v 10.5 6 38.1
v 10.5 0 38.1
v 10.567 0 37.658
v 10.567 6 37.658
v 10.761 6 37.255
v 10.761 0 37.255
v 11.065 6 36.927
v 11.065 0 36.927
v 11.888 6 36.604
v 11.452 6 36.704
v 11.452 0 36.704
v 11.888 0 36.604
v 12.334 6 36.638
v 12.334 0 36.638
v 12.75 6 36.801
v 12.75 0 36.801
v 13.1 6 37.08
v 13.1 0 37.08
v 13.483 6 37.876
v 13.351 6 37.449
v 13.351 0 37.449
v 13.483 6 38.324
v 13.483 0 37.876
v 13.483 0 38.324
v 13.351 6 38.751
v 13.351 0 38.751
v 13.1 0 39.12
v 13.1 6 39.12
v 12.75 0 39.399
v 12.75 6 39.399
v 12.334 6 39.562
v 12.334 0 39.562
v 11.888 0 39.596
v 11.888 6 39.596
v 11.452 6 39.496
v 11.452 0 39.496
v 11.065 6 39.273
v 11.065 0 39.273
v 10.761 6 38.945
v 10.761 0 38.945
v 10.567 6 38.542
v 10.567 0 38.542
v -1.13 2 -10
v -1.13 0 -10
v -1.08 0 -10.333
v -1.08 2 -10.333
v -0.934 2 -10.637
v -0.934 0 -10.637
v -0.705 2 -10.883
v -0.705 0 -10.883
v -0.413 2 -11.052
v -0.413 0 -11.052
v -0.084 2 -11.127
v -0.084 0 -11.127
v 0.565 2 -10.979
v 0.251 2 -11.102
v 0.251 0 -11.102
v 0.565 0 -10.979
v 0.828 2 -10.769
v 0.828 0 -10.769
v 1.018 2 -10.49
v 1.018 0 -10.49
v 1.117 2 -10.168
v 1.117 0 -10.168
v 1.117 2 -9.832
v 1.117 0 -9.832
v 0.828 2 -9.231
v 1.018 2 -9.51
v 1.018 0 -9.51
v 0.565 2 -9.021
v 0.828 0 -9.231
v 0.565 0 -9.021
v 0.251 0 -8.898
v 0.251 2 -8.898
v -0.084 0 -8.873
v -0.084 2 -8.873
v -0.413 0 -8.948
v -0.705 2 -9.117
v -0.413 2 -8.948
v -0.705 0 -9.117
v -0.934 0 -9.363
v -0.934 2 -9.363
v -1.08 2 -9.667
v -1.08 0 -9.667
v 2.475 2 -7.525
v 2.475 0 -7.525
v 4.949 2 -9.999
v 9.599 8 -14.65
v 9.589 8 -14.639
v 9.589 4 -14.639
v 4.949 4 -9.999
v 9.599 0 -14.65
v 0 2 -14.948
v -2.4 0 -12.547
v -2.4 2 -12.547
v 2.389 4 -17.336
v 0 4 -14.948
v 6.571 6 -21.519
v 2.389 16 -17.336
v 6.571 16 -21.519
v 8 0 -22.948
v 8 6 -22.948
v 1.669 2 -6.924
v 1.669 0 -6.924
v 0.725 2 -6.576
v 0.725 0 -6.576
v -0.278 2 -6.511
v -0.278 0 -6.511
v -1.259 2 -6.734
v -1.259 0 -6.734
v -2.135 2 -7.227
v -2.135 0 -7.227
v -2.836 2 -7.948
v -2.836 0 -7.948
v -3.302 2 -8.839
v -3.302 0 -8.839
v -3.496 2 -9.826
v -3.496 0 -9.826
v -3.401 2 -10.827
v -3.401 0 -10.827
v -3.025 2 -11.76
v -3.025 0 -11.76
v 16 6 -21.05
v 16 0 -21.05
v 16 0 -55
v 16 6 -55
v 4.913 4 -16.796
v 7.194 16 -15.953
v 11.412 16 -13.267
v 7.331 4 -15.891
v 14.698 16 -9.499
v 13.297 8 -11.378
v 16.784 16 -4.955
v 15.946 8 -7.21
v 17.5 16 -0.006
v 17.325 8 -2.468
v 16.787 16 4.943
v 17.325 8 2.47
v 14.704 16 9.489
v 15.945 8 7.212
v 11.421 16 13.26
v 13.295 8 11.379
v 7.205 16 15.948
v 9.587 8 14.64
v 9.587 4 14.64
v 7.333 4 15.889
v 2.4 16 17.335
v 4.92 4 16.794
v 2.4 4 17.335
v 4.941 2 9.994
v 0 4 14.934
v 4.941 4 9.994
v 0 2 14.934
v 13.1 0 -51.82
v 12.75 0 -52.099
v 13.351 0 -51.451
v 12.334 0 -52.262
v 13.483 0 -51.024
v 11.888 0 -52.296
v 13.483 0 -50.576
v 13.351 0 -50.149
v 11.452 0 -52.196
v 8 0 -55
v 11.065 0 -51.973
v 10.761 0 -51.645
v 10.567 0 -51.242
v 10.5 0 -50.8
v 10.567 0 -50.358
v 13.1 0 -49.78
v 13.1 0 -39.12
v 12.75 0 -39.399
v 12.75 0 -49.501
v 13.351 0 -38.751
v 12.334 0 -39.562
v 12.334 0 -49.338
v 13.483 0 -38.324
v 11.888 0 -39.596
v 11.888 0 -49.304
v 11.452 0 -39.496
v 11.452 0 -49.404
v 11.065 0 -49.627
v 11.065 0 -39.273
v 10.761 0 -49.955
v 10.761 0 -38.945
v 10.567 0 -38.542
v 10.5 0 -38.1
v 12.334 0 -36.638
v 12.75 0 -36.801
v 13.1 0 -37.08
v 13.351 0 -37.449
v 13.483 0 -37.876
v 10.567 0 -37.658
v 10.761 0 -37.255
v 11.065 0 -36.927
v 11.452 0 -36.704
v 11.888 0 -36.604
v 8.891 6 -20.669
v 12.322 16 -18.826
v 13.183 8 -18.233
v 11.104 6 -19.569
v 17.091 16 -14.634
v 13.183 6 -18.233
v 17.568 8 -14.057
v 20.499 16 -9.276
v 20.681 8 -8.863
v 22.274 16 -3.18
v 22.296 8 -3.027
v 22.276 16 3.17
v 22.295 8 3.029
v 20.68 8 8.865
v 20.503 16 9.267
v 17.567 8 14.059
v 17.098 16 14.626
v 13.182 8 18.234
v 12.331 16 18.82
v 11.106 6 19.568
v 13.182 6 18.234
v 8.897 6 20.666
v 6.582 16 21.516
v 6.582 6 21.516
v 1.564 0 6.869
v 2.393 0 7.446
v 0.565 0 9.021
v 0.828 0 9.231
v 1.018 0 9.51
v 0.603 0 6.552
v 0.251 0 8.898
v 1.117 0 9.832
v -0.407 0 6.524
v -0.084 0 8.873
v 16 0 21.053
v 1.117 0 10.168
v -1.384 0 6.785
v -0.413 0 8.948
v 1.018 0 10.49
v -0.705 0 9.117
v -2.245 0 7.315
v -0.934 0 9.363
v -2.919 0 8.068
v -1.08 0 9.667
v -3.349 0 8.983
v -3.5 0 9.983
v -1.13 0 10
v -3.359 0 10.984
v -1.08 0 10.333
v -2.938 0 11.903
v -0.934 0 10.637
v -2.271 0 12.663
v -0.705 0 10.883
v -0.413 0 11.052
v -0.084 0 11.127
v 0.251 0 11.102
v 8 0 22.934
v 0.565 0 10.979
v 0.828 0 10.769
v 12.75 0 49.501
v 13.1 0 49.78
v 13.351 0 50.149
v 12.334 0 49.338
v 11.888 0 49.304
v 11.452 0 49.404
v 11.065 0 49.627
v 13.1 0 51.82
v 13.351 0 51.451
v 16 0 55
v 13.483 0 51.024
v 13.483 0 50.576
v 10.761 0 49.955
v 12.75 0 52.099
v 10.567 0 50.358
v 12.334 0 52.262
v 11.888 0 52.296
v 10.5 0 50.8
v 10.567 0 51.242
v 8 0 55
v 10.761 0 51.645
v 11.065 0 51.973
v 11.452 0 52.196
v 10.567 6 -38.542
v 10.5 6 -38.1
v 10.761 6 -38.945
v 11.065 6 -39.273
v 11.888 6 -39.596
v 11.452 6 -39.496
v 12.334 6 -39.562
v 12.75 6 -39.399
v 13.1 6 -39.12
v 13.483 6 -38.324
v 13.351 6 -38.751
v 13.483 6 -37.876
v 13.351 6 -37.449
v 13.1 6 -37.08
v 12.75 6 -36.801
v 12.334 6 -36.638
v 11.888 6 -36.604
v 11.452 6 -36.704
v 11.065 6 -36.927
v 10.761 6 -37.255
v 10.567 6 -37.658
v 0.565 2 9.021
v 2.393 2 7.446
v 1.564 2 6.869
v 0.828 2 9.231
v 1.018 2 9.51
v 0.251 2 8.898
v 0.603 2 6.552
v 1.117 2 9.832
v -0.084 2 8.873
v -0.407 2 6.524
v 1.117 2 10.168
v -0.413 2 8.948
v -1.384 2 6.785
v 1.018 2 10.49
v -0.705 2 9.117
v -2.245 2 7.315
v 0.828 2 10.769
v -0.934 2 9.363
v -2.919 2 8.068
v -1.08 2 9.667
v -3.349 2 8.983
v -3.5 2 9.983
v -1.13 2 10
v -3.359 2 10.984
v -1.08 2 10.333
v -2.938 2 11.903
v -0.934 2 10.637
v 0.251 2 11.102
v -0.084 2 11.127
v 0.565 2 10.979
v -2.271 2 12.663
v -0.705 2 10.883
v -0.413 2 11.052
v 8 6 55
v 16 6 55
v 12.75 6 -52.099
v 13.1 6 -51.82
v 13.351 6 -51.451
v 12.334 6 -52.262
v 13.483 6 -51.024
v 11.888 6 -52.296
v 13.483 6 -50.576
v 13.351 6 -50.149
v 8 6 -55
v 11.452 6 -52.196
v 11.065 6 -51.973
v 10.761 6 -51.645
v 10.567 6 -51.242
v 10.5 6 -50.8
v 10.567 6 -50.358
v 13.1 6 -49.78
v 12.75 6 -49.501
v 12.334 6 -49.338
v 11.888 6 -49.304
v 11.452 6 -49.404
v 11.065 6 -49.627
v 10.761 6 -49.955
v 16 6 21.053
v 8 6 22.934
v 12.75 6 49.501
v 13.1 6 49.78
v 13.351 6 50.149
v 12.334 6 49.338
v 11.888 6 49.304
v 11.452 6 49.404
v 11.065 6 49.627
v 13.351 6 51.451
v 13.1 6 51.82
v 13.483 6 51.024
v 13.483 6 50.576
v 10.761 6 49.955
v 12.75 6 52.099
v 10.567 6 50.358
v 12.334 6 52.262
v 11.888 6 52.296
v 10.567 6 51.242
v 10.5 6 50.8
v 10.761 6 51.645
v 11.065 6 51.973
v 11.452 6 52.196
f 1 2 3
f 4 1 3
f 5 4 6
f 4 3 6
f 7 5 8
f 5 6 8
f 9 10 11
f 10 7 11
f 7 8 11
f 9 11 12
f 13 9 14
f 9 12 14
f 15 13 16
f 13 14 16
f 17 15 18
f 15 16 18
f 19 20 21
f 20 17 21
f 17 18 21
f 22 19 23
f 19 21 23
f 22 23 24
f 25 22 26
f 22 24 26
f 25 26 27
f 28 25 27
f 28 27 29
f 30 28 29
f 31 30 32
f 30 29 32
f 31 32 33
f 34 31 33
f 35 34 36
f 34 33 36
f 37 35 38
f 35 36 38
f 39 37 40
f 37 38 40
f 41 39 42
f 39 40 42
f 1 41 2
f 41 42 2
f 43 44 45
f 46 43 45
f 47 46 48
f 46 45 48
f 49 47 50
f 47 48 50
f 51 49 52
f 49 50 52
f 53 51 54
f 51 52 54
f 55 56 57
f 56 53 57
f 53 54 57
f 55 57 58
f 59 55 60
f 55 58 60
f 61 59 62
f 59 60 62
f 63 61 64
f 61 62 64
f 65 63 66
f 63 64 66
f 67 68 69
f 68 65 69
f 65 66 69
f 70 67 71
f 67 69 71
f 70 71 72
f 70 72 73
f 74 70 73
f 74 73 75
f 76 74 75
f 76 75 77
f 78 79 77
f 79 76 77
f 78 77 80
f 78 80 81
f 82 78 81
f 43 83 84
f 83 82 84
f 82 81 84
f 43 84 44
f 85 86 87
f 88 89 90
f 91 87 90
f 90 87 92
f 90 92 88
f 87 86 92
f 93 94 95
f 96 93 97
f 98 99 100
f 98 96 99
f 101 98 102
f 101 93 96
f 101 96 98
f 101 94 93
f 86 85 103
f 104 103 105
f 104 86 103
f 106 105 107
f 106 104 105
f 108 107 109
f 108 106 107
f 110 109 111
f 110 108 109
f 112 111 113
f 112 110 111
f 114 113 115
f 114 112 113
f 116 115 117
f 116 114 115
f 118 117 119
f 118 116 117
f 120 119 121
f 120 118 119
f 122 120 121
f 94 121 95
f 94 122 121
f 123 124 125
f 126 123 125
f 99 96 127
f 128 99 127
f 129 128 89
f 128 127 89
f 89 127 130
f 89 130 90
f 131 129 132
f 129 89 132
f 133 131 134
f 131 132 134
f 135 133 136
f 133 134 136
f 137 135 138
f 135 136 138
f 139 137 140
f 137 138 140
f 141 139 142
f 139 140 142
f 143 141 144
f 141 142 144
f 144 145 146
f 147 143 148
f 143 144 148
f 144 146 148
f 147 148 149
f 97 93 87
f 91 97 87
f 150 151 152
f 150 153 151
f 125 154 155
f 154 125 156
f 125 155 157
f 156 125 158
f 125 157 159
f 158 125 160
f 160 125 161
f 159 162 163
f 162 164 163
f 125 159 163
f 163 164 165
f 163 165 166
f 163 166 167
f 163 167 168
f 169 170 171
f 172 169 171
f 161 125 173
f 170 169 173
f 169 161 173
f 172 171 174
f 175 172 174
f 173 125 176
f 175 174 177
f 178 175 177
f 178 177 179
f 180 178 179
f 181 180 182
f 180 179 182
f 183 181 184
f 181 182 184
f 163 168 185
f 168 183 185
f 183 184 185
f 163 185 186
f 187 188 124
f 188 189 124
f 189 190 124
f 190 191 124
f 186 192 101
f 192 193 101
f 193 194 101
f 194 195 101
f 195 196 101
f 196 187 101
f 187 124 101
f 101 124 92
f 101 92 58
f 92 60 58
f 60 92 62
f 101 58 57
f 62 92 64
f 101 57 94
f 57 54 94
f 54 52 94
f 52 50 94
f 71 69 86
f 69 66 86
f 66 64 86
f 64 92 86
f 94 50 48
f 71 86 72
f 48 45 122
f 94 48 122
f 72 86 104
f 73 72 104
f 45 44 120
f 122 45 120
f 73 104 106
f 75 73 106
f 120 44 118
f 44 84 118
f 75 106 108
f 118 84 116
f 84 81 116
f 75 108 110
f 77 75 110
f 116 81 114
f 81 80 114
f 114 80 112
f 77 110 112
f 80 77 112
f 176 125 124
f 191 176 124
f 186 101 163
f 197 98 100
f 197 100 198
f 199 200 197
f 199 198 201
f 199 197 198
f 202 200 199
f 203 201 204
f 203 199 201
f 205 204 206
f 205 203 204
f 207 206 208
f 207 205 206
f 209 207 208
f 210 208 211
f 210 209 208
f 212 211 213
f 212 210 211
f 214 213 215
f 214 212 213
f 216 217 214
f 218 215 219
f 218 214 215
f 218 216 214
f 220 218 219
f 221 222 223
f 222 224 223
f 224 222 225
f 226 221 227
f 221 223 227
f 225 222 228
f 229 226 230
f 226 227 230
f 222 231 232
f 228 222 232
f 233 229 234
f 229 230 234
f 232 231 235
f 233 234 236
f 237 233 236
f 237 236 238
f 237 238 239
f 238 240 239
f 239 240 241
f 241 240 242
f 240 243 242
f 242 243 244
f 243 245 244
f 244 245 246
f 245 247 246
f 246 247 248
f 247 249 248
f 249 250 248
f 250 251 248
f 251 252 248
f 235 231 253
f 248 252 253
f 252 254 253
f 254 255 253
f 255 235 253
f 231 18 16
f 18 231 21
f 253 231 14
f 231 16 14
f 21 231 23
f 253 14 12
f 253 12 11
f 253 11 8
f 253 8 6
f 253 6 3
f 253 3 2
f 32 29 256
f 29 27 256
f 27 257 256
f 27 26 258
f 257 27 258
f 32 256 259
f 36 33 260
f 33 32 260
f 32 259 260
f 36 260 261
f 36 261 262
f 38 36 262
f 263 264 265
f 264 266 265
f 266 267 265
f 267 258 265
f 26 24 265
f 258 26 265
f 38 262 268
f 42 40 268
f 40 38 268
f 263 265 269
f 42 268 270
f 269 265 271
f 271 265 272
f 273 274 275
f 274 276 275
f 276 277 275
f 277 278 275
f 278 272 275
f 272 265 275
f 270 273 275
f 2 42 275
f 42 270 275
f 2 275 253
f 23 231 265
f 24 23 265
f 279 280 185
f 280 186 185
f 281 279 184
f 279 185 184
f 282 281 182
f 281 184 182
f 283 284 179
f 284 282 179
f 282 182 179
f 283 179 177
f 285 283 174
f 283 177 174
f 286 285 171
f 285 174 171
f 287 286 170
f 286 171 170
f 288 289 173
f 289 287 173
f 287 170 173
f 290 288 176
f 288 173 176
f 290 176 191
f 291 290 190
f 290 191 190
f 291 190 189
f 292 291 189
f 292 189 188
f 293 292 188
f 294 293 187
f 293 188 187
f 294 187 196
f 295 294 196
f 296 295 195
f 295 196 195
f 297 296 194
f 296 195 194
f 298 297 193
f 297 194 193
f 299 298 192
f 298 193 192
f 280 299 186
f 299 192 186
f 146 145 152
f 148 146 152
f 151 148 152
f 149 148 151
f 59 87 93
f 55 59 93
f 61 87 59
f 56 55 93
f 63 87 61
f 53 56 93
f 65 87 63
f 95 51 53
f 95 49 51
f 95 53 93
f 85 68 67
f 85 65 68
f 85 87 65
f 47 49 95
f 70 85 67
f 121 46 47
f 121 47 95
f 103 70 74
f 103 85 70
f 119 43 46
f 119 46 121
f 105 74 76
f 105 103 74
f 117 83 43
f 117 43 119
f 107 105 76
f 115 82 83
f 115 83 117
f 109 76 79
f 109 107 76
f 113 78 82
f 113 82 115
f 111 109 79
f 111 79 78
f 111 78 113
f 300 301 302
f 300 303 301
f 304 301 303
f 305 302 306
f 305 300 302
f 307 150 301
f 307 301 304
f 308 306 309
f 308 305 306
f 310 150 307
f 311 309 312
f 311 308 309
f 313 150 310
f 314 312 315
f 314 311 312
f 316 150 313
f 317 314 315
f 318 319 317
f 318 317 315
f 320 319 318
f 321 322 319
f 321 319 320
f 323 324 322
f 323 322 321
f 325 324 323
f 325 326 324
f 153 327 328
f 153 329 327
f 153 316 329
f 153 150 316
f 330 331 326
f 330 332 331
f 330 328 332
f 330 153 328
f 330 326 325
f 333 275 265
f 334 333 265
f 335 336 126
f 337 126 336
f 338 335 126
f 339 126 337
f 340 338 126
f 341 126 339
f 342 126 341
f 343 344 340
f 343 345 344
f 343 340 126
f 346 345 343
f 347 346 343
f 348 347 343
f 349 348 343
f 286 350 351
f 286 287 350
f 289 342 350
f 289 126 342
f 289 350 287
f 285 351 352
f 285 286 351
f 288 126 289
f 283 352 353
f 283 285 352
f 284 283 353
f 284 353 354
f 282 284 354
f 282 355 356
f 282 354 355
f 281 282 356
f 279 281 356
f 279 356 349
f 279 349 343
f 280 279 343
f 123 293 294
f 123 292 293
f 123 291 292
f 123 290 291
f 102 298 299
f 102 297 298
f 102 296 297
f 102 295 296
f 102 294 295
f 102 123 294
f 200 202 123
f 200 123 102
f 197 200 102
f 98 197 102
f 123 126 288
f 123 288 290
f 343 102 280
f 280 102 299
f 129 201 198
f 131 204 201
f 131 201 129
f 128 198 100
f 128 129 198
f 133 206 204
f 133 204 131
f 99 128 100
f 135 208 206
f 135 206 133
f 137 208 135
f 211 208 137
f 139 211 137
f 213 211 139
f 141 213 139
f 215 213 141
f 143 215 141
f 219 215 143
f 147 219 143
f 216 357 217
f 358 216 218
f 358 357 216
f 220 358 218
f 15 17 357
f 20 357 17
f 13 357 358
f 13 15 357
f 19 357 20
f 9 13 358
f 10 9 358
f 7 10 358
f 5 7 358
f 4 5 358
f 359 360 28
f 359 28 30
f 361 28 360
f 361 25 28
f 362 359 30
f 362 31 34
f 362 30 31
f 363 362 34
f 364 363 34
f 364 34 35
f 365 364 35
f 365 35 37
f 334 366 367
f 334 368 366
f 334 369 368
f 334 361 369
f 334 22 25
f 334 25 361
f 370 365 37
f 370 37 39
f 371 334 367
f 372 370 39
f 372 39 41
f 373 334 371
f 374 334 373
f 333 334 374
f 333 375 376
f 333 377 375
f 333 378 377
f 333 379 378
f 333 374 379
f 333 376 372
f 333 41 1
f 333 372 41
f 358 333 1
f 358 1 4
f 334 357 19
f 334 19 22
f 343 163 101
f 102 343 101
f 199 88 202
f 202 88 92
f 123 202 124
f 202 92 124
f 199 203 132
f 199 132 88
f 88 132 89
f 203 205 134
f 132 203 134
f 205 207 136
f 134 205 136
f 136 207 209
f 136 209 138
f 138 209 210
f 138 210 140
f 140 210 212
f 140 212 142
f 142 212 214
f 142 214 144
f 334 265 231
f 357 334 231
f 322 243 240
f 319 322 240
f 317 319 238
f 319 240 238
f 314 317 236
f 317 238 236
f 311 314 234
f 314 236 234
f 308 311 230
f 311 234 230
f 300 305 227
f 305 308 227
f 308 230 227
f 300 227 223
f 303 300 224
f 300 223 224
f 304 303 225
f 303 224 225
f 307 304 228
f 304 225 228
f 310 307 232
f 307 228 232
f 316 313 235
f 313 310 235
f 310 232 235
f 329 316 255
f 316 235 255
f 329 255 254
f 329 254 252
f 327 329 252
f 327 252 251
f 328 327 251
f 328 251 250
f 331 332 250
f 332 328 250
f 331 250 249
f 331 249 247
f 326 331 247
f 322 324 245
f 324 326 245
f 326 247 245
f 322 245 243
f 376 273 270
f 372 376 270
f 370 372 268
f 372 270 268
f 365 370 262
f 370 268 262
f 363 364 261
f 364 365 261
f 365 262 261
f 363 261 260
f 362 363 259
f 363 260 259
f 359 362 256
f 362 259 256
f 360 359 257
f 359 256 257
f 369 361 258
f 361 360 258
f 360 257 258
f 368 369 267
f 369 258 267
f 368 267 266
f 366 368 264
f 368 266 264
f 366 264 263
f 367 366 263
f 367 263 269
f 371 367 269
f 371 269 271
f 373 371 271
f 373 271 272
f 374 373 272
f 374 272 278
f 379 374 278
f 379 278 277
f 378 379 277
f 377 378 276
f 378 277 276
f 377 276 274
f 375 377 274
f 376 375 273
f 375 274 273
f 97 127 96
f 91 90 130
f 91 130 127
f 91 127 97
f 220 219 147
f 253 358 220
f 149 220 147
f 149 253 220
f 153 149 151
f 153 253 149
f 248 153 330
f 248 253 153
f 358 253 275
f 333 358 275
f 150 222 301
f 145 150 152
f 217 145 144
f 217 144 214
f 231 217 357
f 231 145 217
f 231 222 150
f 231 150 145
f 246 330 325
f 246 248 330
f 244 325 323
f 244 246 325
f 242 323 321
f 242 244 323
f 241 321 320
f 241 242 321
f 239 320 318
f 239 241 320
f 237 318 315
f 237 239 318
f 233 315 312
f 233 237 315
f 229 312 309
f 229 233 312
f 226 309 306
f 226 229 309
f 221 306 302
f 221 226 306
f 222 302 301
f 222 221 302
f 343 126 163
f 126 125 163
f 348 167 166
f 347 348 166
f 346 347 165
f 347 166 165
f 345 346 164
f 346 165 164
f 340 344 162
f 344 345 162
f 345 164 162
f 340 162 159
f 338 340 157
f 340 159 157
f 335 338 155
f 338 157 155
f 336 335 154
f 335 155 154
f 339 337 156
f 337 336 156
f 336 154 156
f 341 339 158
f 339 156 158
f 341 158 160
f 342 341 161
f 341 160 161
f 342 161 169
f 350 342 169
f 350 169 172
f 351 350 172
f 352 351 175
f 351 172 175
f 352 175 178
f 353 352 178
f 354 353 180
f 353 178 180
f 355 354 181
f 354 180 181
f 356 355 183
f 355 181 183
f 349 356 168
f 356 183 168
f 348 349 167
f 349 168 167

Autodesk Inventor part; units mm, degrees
ref_plane "YZ Plane" through (0, 0, 0) normal (1, 0, 0) x (0, 1, 0)
ref_plane "XZ Plane" through (0, 0, 0) normal (0, 1, 0) x (-1, 0, 0)
ref_plane "XY Plane" through (0, 0, 0) normal (0, 0, 1) x (1, 0, 0)
sketch "Sketch1" plane through (0, 0, 0) normal (0, 1, 0) x (-1, 0, 0)
  arc A0 (-2.4004, 17.3346) -> (-2.3887, -17.3362) centre (0, 0) ccw
  arc A1 (-6.5816, 21.5159) -> (-6.5714, -21.519) centre (0, 0) ccw
  circle A2 centre (0, 10) radius 1
  circle A3 centre (0, -10) radius 1
  arc A4 (-2.3933, 7.4462) -> (2.2712, 12.663) centre (0, 10) ccw
  arc A5 (2.4002, -12.5474) -> (-2.4749, -7.5251) centre (0, -10) ccw
  line L0 (-8, 55) -> (-16, 55)
  line L1 (-16, -55) -> (-8, -55)
  line L2 (-8, -55) -> (-8, -22.9476)
  line L3 (-8, 22.9342) -> (-8, 55)
  line L4 (-16, -23.152) -> (-16, -55)
  line L5 (-8, 22.9342) -> (2.5474, 12.3868)
  line L6 (-8, 22.9342) -> (6.9163, 22.9342) construction
  line L7 (2.5474, -12.4002) -> (-8, -22.9476)
  line L8 (-2.4749, -7.5251) -> (-9.5993, -14.6496)
  circle A6 centre (-12, -50.8) radius 1.5
  circle A7 centre (-12, -38.1) radius 1.5
  circle A8 centre (-12, 50.8) radius 1.5
  circle A9 centre (-12, 38.1) radius 1.5
  line L9 (-16, 55) -> (-16, 21.0529)
  line L10 (-9.5993, -14.6496) -> (-16, -21.0503)
  line L11 (-16, -21.0503) -> (-16, -23.152)
  line L12 (-2.3933, 7.4462) -> (-16, 21.0529)
  line L13 (0, 14.9342) -> (-4.9407, 9.9935)
  line L14 (0, -14.9476) -> (-4.9487, -9.9989)
  point P0 (-9.5889, -14.6391)
  point P1 (-9.5873, 14.6401)
  dimension "d7" = 35
  dimension "d8" = 45
  dimension "d9" = 2
  dimension "d10" = 2
  dimension "d11" = 10
  dimension "d12" = 10
  dimension "d13" = 7
  dimension "d14" = 7
  dimension "d19" = 8
  dimension "d20" = 110
  dimension "d21" = 8
  dimension "d22" = 55
  dimension "d23" = 45
  dimension "d25" = 3
  dimension "d26" = 3
  dimension "d27" = 3
  dimension "d28" = 3
  dimension "d29" = 38.1
  dimension "d31" = 50.8
sketch "Sketch2" plane through (0, 0, 0) normal (0, 1, 0) x (-1, 0, 0)
  arc A0 (-2.4004, 17.3346) -> (-2.3887, -17.3362) centre (0, 0) ccw
  arc A1 (-6.5816, 21.5159) -> (-6.5714, -21.519) centre (0, 0) ccw
  circle A2 centre (0, 10) radius 1.13
  circle A3 centre (0, -10) radius 1.13
  arc A4 (-2.3933, 7.4462) -> (2.2712, 12.663) centre (0, 10) ccw
  arc A5 (2.4002, -12.5474) -> (-2.4749, -7.5251) centre (0, -10) ccw
  line L0 (-8, 55) -> (-16, 55)
  line L1 (-16, -55) -> (-8, -55)
  line L2 (-8, -55) -> (-8, -22.9476)
  line L3 (-8, 22.9342) -> (-8, 55)
  line L4 (-16, -23.152) -> (-16, -55)
  line L5 (-8, 22.9342) -> (2.5474, 12.3868)
  line L6 (-8, 22.9342) -> (6.9163, 22.9342) construction
  line L7 (2.5474, -12.4002) -> (-8, -22.9476)
  line L8 (-2.4749, -7.5251) -> (-9.5993, -14.6496)
  circle A6 centre (-12, -50.8) radius 1.5
  circle A7 centre (-12, -38.1) radius 1.5
  circle A8 centre (-12, 50.8) radius 1.5
  circle A9 centre (-12, 38.1) radius 1.5
  line L9 (-16, 55) -> (-16, 21.0529)
  line L10 (-9.5993, -14.6496) -> (-16, -21.0503)
  line L11 (-16, -21.0503) -> (-16, -23.152)
  line L12 (-2.3933, 7.4462) -> (-16, 21.0529)
  line L13 (0, 14.9342) -> (-4.9407, 9.9935)
  line L14 (0, -14.9476) -> (-4.9487, -9.9989)
  dimension "d54" = 35
  dimension "d55" = 45
  dimension "d56" = 2.26
  dimension "d57" = 2.26
  dimension "d58" = 10
  dimension "d59" = 10
  dimension "d60" = 7
  dimension "d61" = 7
  dimension "d62" = 8
  dimension "d63" = 110
  dimension "d64" = 8
  dimension "d65" = 55
  dimension "d66" = 45
  dimension "d67" = 3
  dimension "d68" = 3
  dimension "d69" = 3
  dimension "d70" = 3
  dimension "d71" = 38.1
  dimension "d72" = 50.8
sketch "Sketch3" plane through (0, 0, 0) normal (0, 1, 0) x (-1, 0, 0)
  arc A0 (-2.4004, 17.3346) -> (-2.3887, -17.3362) centre (0, 0) ccw
  arc A1 (-6.5816, 21.5159) -> (-6.5714, -21.519) centre (0, 0) ccw
  circle A2 centre (0, 10) radius 1
  circle A3 centre (0, -10) radius 1
  arc A4 (-2.3933, 7.4462) -> (2.2712, 12.663) centre (0, 10) ccw
  arc A5 (2.4002, -12.5474) -> (-2.4749, -7.5251) centre (0, -10) ccw
  line L0 (-8, 55) -> (-16, 55)
  line L1 (-16, -55) -> (-8, -55)
  line L2 (-8, -55) -> (-8, -22.9476)
  line L3 (-8, 22.9342) -> (-8, 55)
  line L4 (-16, -23.152) -> (-16, -55)
  line L5 (-8, 22.9342) -> (2.5474, 12.3868)
  line L6 (-8, 22.9342) -> (6.9163, 22.9342) construction
  line L7 (2.5474, -12.4002) -> (-8, -22.9476)
  line L8 (-2.4749, -7.5251) -> (-9.5993, -14.6496)
  circle A6 centre (-12, -50.8) radius 1.5
  circle A7 centre (-12, -38.1) radius 1.5
  circle A8 centre (-12, 50.8) radius 1.5
  circle A9 centre (-12, 38.1) radius 1.5
  line L9 (-16, 55) -> (-16, 21.0529)
  line L10 (-9.5993, -14.6496) -> (-16, -21.0503)
  line L11 (-16, -21.0503) -> (-16, -23.152)
  line L12 (-2.3933, 7.4462) -> (-16, 21.0529)
  line L13 (0, 14.9342) -> (-4.9407, 9.9935)
  line L14 (0, -14.9476) -> (-4.9487, -9.9989)
  point P0 (-9.5889, -14.6391)
  point P1 (-9.5873, 14.6401)
  point P2 (-13.1831, -18.2334)
  point P3 (-13.1816, 18.2345)
  dimension "d92" = 35
  dimension "d93" = 45
  dimension "d94" = 2
  dimension "d95" = 2
  dimension "d96" = 10
  dimension "d97" = 10
  dimension "d98" = 7
  dimension "d99" = 7
  dimension "d100" = 8
  dimension "d101" = 110
  dimension "d102" = 8
  dimension "d103" = 55
  dimension "d104" = 45
  dimension "d105" = 3
  dimension "d106" = 3
  dimension "d107" = 3
  dimension "d108" = 3
  dimension "d109" = 38.1
  dimension "d110" = 50.8
sketch "Sketch4" plane through (0, 0, 0) normal (0, 1, 0) x (-1, 0, 0)
  arc A0 (-2.4004, 17.3346) -> (-2.3887, -17.3362) centre (0, 0) ccw
  arc A1 (-6.5816, 21.5159) -> (-6.5714, -21.519) centre (0, 0) ccw
  circle A2 centre (0, 10) radius 1
  circle A3 centre (0, -10) radius 1
  arc A4 (-2.3933, 7.4462) -> (2.2712, 12.663) centre (0, 10) ccw
  arc A5 (2.4002, -12.5474) -> (-2.4749, -7.5251) centre (0, -10) ccw
  line L0 (-8, 55) -> (-16, 55)
  line L1 (-16, -55) -> (-8, -55)
  line L2 (-8, -55) -> (-8, -22.9476)
  line L3 (-8, 22.9342) -> (-8, 55)
  line L4 (-16, -23.152) -> (-16, -55)
  line L5 (-8, 22.9342) -> (2.5474, 12.3868)
  line L6 (-8, 22.9342) -> (6.9163, 22.9342) construction
  line L7 (2.5474, -12.4002) -> (-8, -22.9476)
  line L8 (-2.4749, -7.5251) -> (-9.5993, -14.6496)
  circle A6 centre (-12, -50.8) radius 1.5
  circle A7 centre (-12, -38.1) radius 1.5
  circle A8 centre (-12, 50.8) radius 1.5
  circle A9 centre (-12, 38.1) radius 1.5
  line L9 (-16, 55) -> (-16, 21.0529)
  line L10 (-9.5993, -14.6496) -> (-16, -21.0503)
  line L11 (-16, -21.0503) -> (-16, -23.152)
  line L12 (-2.3933, 7.4462) -> (-16, 21.0529)
  line L13 (0, 14.9342) -> (-4.9407, 9.9935)
  line L14 (0, -14.9476) -> (-4.9487, -9.9989)
  dimension "d35" = 35
  dimension "d36" = 45
  dimension "d37" = 2
  dimension "d38" = 2
  dimension "d39" = 10
  dimension "d40" = 10
  dimension "d41" = 7
  dimension "d42" = 7
  dimension "d43" = 8
  dimension "d44" = 110
  dimension "d45" = 8
  dimension "d46" = 55
  dimension "d47" = 45
  dimension "d48" = 3
  dimension "d49" = 3
  dimension "d50" = 3
  dimension "d51" = 3
  dimension "d52" = 38.1
  dimension "d53" = 50.8
sketch "Sketch5" plane through (0, 0, 0) normal (0, 1, 0) x (-1, 0, 0)
  arc A0 (-2.4004, 17.3346) -> (-2.3887, -17.3362) centre (0, 0) ccw
  arc A1 (-6.5816, 21.5159) -> (-6.5714, -21.519) centre (0, 0) ccw
  circle A2 centre (0, 10) radius 1
  circle A3 centre (0, -10) radius 1
  arc A4 (-2.3933, 7.4462) -> (2.2712, 12.663) centre (0, 10) ccw
  arc A5 (2.4002, -12.5474) -> (-2.4749, -7.5251) centre (0, -10) ccw
  line L0 (-8, 55) -> (-16, 55)
  line L1 (-16, -55) -> (-8, -55)
  line L2 (-8, -55) -> (-8, -22.9476)
  line L3 (-8, 22.9342) -> (-8, 55)
  line L4 (-16, -23.152) -> (-16, -55)
  line L5 (-8, 22.9342) -> (2.5474, 12.3868)
  line L6 (-8, 22.9342) -> (6.9163, 22.9342) construction
  line L7 (2.5474, -12.4002) -> (-8, -22.9476)
  line L8 (-2.4749, -7.5251) -> (-9.5993, -14.6496)
  circle A6 centre (-12, -50.8) radius 1.5
  circle A7 centre (-12, -38.1) radius 1.5
  circle A8 centre (-12, 50.8) radius 1.5
  circle A9 centre (-12, 38.1) radius 1.5
  line L9 (-16, 55) -> (-16, 21.0529)
  line L10 (-9.5993, -14.6496) -> (-16, -21.0503)
  line L11 (-16, -21.0503) -> (-16, -23.152)
  line L12 (-2.3933, 7.4462) -> (-16, 21.0529)
  line L13 (0, 14.9342) -> (-4.9407, 9.9935)
  line L14 (0, -14.9476) -> (-4.9487, -9.9989)
  point P0 (-9.5873, 14.6401)
  point P1 (-13.1816, 18.2345)
  point P2 (-13.1831, -18.2334)
  point P3 (-9.5889, -14.6391)
  dimension "d73" = 35
  dimension "d74" = 45
  dimension "d75" = 2
  dimension "d76" = 2
  dimension "d77" = 10
  dimension "d78" = 10
  dimension "d79" = 7
  dimension "d80" = 7
  dimension "d81" = 8
  dimension "d82" = 110
  dimension "d83" = 8
  dimension "d84" = 55
  dimension "d85" = 45
  dimension "d86" = 3
  dimension "d87" = 3
  dimension "d88" = 3
  dimension "d89" = 3
  dimension "d90" = 38.1
  dimension "d91" = 50.8
extrude "Extrusion1" add sketch "Sketch2" along normal blind 2 contours L5 A4 L12 L13 | L8 A5 L7 L14
extrude "Extrusion2" add sketch "Sketch1" along normal blind 4 contours L5 L13 L12 A0 | L8 L14 L7 A0
extrude "Extrusion3" add sketch "Sketch3" along normal blind 6 contours A1 L12 L9 L0 L3 L5 | A1 L7 L2 L1 L4 L11 L10
extrude "Extrusion4" add sketch "Sketch4" along normal blind 16 contours A0 L12 A1 L5 | A0 L8 L10 A1 L12 | A0 L7 A1 L10 L8
extrude "Extrusion5" cut sketch "Sketch5" along normal blind 8 contours A0 L8 L10 A1 L12
thread "Thread1" size "4-40 UNC" class "2B" standard "ANSI Unified Screw Threads" full length
thread "Thread2" size "4-40 UNC" class "2B" standard "ANSI Unified Screw Threads" full length
properties part number "snHeadbarHolder2"
